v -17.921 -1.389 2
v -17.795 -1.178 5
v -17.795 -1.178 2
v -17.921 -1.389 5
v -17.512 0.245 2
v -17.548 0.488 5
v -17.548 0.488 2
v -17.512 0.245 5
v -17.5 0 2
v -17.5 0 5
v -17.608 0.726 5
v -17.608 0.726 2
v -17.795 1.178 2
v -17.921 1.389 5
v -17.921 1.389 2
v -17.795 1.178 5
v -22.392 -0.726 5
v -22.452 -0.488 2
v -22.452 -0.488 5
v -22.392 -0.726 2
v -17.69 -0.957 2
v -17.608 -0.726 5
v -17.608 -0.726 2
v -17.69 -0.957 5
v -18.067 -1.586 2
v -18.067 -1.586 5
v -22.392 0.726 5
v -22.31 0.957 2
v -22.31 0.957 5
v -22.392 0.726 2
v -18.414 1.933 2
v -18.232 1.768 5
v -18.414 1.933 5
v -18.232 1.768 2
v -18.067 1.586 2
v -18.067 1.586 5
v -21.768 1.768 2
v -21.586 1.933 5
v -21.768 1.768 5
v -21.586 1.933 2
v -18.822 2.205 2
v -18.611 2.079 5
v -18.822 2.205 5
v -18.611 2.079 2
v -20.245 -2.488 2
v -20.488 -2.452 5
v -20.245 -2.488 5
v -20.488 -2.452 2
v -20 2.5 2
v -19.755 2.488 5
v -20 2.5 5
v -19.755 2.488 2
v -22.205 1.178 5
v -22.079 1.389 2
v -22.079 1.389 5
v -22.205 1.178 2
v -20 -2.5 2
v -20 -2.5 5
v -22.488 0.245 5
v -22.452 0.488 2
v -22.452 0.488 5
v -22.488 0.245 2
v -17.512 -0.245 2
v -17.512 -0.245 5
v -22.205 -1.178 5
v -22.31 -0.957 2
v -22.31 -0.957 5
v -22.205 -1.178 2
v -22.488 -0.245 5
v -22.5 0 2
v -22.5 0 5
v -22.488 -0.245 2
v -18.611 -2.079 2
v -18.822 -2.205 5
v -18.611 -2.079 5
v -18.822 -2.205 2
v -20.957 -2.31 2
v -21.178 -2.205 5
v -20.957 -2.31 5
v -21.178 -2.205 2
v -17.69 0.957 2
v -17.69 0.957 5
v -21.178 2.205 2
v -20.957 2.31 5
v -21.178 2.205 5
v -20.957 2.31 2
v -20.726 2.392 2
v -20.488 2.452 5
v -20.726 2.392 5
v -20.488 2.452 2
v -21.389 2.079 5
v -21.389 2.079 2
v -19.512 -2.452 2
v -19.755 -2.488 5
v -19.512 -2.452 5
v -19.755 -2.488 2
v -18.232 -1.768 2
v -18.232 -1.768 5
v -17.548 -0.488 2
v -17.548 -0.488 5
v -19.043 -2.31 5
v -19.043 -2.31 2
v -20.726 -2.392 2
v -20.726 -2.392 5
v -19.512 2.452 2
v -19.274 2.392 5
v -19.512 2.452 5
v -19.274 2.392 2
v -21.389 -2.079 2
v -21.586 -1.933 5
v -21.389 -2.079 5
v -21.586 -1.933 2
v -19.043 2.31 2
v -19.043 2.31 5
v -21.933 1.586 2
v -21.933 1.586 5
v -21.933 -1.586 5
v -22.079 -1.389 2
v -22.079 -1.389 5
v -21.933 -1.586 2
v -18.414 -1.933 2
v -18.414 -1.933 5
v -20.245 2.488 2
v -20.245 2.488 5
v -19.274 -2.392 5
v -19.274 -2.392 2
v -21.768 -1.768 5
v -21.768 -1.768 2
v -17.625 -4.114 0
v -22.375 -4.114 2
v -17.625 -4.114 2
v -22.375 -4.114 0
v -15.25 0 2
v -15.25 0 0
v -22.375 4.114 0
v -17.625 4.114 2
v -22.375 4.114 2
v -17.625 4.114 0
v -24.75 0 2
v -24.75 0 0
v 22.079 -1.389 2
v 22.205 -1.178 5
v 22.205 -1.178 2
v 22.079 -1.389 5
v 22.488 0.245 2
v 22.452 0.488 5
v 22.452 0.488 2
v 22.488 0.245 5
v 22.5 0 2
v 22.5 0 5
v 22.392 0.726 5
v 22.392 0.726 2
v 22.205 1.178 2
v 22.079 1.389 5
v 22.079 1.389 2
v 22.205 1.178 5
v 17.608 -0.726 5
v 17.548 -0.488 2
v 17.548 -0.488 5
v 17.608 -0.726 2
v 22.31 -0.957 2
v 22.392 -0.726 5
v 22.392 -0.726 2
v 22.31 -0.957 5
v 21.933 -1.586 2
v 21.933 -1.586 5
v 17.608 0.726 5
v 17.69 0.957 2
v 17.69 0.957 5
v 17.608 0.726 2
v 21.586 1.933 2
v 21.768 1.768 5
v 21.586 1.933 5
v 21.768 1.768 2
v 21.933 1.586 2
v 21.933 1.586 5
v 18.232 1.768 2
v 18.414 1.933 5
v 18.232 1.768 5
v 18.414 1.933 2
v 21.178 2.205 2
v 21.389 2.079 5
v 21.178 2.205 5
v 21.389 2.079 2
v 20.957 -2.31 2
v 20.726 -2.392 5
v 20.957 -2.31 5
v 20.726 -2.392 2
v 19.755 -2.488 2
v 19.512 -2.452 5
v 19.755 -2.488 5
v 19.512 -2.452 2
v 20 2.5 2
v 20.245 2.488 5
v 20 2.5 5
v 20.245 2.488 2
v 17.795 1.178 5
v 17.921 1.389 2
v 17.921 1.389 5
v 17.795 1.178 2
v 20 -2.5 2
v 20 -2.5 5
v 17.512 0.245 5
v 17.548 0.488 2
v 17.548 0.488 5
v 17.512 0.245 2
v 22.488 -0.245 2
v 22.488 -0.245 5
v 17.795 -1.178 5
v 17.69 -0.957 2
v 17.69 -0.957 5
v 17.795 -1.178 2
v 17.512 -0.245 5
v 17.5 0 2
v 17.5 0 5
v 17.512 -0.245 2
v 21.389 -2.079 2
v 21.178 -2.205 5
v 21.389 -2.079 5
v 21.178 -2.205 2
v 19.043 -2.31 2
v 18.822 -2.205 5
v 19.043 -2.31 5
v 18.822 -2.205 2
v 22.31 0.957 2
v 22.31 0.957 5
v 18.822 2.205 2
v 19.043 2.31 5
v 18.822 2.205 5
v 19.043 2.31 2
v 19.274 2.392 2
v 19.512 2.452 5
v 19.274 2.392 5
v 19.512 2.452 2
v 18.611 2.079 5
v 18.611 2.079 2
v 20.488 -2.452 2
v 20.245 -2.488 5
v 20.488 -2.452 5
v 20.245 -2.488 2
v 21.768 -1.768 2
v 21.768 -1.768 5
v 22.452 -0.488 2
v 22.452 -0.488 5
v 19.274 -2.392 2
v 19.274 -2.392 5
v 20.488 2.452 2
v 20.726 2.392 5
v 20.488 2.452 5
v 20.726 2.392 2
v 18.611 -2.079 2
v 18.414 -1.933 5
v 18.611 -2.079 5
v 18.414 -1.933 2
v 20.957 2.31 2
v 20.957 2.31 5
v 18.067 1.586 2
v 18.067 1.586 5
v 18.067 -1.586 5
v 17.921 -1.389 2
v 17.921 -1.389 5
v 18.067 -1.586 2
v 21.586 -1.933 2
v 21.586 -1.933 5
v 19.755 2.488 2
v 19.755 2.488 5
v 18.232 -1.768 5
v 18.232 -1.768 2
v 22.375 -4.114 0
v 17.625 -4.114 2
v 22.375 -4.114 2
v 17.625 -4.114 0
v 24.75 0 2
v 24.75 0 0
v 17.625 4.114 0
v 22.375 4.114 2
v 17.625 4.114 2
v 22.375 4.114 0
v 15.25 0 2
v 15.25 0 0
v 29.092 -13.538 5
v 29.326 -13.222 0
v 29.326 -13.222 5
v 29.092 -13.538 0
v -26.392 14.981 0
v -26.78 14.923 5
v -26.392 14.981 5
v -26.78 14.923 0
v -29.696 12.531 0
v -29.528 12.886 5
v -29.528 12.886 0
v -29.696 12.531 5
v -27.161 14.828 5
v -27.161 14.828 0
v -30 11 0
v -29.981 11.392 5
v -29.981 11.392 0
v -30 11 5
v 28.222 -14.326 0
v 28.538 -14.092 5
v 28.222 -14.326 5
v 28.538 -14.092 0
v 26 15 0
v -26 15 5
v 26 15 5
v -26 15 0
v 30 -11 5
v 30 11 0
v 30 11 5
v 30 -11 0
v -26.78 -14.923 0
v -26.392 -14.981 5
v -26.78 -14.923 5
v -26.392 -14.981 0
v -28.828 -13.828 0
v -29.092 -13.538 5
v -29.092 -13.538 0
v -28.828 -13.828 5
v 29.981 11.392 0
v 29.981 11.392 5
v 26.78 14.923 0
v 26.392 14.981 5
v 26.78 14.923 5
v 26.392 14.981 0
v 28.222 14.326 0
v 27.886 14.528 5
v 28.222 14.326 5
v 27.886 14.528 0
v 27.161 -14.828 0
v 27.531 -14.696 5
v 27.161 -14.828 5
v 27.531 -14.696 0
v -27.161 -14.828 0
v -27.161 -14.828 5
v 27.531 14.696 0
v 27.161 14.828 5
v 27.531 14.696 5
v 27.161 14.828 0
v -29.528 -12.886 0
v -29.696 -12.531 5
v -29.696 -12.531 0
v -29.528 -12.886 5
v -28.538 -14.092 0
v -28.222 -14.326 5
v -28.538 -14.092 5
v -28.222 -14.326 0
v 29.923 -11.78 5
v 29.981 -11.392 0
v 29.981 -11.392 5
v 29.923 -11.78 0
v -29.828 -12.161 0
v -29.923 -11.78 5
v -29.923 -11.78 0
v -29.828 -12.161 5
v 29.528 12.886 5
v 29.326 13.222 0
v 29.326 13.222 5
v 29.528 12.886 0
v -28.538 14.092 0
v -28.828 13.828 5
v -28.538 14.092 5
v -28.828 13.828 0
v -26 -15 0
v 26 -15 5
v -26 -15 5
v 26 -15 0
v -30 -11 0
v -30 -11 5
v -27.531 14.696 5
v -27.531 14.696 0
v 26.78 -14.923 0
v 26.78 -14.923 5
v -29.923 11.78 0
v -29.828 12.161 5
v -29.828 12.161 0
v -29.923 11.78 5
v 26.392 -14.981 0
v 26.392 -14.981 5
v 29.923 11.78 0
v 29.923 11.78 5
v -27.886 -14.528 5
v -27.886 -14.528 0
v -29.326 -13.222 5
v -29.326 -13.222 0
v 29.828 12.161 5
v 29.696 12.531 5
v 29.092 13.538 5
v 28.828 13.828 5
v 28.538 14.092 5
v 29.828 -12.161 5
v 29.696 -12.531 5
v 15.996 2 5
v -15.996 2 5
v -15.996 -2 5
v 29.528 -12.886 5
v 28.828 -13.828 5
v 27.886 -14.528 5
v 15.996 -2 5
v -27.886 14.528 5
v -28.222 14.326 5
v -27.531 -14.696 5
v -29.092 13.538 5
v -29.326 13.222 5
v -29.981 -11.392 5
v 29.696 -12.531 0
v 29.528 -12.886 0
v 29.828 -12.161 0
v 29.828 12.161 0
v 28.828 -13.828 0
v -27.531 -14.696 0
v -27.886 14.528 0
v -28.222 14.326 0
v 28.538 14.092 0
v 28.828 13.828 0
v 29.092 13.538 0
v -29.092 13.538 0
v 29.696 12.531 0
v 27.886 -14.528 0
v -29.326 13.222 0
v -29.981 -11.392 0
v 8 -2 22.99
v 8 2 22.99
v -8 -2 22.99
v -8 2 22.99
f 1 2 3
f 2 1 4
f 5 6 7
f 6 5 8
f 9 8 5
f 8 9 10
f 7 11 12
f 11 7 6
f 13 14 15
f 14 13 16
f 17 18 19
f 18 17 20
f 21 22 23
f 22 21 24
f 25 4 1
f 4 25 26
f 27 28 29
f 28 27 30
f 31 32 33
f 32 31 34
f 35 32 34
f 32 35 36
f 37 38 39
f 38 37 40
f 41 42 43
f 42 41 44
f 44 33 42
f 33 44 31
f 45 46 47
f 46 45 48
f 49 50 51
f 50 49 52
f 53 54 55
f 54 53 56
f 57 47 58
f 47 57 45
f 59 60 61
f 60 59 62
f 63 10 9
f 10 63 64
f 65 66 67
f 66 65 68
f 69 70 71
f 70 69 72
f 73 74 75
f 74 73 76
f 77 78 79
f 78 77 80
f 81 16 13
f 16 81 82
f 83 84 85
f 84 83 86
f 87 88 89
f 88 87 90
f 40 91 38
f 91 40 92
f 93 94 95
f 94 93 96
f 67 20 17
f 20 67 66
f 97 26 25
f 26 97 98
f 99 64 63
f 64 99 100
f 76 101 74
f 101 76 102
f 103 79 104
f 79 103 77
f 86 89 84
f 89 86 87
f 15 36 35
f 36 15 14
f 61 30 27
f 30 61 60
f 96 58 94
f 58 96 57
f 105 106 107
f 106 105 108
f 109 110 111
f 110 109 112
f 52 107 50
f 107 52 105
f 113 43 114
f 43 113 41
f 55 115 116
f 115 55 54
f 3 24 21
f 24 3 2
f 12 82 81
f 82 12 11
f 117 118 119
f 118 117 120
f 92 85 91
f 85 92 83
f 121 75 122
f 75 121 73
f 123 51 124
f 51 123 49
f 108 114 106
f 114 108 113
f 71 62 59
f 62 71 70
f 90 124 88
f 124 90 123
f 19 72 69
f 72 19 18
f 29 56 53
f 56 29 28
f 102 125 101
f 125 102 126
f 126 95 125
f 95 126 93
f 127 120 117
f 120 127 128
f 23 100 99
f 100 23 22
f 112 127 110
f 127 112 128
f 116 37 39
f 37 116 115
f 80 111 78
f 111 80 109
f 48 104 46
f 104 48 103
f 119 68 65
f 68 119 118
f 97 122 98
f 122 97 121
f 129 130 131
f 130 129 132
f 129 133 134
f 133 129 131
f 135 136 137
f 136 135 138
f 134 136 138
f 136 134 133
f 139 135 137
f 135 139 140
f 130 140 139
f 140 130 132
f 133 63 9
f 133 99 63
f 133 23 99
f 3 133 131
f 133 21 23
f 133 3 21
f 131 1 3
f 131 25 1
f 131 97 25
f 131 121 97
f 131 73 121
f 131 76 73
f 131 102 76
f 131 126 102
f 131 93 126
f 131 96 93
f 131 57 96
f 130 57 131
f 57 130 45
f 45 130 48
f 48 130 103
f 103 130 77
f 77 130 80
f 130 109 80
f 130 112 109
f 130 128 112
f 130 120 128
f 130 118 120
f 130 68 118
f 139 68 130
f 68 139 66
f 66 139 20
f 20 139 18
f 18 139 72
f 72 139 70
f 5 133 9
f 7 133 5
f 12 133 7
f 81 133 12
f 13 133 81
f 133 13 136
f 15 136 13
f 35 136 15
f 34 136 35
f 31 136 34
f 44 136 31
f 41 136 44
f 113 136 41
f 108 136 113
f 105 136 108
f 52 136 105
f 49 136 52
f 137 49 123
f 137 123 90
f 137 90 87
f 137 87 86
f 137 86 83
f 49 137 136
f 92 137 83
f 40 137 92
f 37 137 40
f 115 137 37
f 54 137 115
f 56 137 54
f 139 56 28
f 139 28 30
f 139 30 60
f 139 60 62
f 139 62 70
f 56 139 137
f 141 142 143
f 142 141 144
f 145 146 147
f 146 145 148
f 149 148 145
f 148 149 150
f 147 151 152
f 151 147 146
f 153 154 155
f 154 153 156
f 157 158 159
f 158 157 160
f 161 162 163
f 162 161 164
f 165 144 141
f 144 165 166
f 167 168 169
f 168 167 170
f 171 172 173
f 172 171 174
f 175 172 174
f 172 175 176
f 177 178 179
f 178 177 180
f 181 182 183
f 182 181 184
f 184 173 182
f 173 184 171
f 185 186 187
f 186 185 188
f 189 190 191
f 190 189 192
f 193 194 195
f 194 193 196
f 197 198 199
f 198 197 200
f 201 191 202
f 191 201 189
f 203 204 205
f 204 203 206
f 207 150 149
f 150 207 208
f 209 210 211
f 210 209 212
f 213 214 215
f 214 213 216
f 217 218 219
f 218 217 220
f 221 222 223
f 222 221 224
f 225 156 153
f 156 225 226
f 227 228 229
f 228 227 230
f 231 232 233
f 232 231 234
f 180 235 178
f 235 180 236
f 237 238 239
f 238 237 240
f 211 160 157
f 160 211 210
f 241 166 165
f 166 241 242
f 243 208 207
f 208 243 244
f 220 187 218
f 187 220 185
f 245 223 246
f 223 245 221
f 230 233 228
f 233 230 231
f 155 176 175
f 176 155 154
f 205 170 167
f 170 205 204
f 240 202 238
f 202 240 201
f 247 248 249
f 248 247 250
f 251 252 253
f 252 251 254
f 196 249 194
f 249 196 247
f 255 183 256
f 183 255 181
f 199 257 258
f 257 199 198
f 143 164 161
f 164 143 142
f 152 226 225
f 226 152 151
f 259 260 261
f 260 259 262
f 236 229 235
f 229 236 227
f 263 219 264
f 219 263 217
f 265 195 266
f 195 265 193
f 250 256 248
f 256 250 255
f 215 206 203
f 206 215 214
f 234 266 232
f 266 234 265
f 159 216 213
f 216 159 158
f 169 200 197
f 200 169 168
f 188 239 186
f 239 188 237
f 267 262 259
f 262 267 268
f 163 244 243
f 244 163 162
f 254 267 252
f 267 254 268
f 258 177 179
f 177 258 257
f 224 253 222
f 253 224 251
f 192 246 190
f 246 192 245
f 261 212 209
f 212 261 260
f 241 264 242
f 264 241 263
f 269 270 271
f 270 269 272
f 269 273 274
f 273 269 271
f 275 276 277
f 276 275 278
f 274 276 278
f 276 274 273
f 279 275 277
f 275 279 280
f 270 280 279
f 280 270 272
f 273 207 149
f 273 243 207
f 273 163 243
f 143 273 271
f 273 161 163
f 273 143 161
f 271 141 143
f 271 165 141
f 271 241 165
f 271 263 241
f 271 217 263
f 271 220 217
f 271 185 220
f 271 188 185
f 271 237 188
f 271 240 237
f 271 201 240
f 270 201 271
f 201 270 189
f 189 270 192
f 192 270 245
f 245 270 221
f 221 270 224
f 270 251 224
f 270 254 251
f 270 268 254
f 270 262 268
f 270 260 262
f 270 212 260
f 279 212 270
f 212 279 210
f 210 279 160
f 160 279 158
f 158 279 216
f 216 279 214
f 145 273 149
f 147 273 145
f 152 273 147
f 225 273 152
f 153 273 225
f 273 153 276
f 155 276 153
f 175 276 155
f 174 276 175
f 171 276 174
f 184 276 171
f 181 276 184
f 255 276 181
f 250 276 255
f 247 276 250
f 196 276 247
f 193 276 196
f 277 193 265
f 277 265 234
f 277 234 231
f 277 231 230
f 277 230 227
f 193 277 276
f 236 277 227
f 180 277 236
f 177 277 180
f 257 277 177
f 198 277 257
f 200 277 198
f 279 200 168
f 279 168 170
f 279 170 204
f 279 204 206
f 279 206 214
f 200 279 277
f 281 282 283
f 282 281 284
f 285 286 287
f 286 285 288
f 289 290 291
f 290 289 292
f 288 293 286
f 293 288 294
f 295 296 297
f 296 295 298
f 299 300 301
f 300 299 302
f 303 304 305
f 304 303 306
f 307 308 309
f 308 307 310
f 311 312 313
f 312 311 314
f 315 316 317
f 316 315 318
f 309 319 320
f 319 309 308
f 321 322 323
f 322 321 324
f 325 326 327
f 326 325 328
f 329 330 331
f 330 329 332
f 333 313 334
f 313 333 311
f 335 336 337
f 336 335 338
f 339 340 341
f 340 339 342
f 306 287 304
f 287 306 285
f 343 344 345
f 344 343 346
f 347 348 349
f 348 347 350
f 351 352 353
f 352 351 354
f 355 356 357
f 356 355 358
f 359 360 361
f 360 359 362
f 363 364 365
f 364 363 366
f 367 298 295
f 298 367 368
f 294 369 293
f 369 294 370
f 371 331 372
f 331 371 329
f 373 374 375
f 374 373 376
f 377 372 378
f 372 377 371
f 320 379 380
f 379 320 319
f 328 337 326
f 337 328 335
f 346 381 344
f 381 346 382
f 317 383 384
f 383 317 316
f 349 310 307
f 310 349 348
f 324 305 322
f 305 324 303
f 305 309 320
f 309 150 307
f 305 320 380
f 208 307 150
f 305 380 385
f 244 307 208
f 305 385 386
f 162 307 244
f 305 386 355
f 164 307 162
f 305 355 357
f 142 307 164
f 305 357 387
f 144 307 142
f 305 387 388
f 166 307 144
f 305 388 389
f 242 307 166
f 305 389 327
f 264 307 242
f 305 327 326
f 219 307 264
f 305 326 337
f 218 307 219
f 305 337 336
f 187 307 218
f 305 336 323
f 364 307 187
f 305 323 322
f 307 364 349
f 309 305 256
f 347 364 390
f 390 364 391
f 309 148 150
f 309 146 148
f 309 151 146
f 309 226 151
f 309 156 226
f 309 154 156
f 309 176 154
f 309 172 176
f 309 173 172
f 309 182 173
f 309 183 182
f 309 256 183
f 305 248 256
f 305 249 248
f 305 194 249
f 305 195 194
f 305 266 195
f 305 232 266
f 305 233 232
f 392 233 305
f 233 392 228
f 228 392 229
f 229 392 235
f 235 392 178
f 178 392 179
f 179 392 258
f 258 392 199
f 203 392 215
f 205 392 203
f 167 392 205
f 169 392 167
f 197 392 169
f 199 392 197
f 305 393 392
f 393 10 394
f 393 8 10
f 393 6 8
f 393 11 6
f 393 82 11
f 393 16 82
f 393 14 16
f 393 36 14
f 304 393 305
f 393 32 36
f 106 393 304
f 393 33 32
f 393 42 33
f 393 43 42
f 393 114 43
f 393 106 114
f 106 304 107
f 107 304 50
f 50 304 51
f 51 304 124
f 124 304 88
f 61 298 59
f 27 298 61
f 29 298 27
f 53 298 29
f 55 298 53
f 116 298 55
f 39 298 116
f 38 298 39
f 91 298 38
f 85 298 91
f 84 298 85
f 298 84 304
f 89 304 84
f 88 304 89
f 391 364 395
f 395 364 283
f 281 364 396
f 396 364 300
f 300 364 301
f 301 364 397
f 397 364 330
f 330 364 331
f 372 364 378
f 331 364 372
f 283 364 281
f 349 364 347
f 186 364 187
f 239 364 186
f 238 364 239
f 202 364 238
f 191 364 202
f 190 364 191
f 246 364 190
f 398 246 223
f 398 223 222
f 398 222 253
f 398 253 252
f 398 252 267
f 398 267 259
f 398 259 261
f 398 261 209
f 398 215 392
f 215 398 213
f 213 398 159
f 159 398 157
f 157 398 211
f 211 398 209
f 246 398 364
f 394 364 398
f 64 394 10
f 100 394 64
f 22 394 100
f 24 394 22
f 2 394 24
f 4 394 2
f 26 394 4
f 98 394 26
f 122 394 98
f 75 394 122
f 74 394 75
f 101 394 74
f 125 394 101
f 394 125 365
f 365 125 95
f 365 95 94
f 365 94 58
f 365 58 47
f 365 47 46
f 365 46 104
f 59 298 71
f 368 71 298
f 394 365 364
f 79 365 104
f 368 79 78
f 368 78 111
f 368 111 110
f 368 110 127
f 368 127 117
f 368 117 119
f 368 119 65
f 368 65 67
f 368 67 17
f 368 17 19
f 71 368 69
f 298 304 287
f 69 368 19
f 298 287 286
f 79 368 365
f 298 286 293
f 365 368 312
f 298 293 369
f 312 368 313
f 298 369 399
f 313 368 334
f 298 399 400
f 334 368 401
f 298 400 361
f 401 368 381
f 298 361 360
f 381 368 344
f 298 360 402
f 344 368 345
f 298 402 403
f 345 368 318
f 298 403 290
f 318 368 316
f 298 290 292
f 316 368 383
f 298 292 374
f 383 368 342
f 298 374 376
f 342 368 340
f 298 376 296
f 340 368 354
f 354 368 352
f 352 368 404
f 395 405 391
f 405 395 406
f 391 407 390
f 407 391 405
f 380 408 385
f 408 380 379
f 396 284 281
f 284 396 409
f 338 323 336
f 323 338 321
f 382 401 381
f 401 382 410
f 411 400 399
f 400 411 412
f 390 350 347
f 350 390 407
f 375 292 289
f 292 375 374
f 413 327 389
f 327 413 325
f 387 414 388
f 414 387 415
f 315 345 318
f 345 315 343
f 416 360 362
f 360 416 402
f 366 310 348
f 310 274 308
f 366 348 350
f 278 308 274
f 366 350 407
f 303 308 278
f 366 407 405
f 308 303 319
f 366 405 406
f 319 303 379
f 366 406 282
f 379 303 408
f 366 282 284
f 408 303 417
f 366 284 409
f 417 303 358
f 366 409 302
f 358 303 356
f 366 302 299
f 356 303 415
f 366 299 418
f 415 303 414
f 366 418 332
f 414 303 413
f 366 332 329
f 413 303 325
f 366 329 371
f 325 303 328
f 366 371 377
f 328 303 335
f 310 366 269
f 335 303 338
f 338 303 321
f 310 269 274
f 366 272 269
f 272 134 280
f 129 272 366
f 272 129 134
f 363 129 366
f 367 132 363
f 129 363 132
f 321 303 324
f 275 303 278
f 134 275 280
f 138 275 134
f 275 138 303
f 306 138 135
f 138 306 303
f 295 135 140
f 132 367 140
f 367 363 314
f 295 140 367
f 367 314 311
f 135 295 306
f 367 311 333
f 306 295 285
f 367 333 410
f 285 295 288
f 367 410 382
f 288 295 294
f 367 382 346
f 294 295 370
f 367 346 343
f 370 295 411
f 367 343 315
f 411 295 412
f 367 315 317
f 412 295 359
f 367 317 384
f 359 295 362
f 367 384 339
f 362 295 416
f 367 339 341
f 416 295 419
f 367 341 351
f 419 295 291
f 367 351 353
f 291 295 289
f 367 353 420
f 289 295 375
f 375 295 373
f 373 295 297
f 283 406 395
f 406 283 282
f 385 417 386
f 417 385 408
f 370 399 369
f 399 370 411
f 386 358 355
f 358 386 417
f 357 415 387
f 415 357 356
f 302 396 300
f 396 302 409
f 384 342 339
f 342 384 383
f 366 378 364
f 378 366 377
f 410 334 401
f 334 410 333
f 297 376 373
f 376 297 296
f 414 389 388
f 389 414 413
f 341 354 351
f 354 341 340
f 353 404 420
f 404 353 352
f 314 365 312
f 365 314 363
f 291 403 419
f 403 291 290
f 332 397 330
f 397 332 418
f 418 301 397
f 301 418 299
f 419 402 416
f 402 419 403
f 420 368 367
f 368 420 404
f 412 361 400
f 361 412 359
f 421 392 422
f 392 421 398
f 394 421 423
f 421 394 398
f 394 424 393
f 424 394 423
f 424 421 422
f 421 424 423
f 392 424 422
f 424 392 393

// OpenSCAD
// Mounting bracket: a small example for SCAD2STEP.
// Required Notice: Copyright Matthew Armstrong (https://github.com/The-Dorkknight)
// Licensed under the PolyForm Noncommercial License 1.0.0. No warranty.

/* [Plate] */
// Plate length (mm)
length = 60; // [30:5:120]
// Plate width (mm)
width = 30; // [20:2:60]
// Plate thickness (mm)
thickness = 5; // [3:1:12]

/* [Holes] */
// Mounting hole diameter (mm)
hole_d = 5; // [3:0.5:10]
// Add a hexagonal nut trap under each hole
nut_trap = true;

/* [Rib] */
// Height of the stiffening rib (mm)
rib_h = 18; // [0:2:40]

$fn = 64;

module plate() {
    difference() {
        hull() for (x = [-1, 1], y = [-1, 1])
            translate([x * (length / 2 - 4), y * (width / 2 - 4), 0])
                cylinder(h = thickness, r = 4);
        for (x = [-1, 1])
            translate([x * (length / 2 - 10), 0, -1]) {
                cylinder(h = thickness + 2, d = hole_d);
                if (nut_trap) cylinder(h = 3, d = hole_d * 1.9, $fn = 6);
            }
    }
}

plate();
if (rib_h > 0)
    translate([0, 0, thickness - 0.01])
        rotate([90, 0, 0])
            linear_extrude(height = 4, center = true)
                polygon([[-length / 2 + 14, 0], [length / 2 - 14, 0], [length / 2 - 22, rib_h], [-length / 2 + 22, rib_h]]);
